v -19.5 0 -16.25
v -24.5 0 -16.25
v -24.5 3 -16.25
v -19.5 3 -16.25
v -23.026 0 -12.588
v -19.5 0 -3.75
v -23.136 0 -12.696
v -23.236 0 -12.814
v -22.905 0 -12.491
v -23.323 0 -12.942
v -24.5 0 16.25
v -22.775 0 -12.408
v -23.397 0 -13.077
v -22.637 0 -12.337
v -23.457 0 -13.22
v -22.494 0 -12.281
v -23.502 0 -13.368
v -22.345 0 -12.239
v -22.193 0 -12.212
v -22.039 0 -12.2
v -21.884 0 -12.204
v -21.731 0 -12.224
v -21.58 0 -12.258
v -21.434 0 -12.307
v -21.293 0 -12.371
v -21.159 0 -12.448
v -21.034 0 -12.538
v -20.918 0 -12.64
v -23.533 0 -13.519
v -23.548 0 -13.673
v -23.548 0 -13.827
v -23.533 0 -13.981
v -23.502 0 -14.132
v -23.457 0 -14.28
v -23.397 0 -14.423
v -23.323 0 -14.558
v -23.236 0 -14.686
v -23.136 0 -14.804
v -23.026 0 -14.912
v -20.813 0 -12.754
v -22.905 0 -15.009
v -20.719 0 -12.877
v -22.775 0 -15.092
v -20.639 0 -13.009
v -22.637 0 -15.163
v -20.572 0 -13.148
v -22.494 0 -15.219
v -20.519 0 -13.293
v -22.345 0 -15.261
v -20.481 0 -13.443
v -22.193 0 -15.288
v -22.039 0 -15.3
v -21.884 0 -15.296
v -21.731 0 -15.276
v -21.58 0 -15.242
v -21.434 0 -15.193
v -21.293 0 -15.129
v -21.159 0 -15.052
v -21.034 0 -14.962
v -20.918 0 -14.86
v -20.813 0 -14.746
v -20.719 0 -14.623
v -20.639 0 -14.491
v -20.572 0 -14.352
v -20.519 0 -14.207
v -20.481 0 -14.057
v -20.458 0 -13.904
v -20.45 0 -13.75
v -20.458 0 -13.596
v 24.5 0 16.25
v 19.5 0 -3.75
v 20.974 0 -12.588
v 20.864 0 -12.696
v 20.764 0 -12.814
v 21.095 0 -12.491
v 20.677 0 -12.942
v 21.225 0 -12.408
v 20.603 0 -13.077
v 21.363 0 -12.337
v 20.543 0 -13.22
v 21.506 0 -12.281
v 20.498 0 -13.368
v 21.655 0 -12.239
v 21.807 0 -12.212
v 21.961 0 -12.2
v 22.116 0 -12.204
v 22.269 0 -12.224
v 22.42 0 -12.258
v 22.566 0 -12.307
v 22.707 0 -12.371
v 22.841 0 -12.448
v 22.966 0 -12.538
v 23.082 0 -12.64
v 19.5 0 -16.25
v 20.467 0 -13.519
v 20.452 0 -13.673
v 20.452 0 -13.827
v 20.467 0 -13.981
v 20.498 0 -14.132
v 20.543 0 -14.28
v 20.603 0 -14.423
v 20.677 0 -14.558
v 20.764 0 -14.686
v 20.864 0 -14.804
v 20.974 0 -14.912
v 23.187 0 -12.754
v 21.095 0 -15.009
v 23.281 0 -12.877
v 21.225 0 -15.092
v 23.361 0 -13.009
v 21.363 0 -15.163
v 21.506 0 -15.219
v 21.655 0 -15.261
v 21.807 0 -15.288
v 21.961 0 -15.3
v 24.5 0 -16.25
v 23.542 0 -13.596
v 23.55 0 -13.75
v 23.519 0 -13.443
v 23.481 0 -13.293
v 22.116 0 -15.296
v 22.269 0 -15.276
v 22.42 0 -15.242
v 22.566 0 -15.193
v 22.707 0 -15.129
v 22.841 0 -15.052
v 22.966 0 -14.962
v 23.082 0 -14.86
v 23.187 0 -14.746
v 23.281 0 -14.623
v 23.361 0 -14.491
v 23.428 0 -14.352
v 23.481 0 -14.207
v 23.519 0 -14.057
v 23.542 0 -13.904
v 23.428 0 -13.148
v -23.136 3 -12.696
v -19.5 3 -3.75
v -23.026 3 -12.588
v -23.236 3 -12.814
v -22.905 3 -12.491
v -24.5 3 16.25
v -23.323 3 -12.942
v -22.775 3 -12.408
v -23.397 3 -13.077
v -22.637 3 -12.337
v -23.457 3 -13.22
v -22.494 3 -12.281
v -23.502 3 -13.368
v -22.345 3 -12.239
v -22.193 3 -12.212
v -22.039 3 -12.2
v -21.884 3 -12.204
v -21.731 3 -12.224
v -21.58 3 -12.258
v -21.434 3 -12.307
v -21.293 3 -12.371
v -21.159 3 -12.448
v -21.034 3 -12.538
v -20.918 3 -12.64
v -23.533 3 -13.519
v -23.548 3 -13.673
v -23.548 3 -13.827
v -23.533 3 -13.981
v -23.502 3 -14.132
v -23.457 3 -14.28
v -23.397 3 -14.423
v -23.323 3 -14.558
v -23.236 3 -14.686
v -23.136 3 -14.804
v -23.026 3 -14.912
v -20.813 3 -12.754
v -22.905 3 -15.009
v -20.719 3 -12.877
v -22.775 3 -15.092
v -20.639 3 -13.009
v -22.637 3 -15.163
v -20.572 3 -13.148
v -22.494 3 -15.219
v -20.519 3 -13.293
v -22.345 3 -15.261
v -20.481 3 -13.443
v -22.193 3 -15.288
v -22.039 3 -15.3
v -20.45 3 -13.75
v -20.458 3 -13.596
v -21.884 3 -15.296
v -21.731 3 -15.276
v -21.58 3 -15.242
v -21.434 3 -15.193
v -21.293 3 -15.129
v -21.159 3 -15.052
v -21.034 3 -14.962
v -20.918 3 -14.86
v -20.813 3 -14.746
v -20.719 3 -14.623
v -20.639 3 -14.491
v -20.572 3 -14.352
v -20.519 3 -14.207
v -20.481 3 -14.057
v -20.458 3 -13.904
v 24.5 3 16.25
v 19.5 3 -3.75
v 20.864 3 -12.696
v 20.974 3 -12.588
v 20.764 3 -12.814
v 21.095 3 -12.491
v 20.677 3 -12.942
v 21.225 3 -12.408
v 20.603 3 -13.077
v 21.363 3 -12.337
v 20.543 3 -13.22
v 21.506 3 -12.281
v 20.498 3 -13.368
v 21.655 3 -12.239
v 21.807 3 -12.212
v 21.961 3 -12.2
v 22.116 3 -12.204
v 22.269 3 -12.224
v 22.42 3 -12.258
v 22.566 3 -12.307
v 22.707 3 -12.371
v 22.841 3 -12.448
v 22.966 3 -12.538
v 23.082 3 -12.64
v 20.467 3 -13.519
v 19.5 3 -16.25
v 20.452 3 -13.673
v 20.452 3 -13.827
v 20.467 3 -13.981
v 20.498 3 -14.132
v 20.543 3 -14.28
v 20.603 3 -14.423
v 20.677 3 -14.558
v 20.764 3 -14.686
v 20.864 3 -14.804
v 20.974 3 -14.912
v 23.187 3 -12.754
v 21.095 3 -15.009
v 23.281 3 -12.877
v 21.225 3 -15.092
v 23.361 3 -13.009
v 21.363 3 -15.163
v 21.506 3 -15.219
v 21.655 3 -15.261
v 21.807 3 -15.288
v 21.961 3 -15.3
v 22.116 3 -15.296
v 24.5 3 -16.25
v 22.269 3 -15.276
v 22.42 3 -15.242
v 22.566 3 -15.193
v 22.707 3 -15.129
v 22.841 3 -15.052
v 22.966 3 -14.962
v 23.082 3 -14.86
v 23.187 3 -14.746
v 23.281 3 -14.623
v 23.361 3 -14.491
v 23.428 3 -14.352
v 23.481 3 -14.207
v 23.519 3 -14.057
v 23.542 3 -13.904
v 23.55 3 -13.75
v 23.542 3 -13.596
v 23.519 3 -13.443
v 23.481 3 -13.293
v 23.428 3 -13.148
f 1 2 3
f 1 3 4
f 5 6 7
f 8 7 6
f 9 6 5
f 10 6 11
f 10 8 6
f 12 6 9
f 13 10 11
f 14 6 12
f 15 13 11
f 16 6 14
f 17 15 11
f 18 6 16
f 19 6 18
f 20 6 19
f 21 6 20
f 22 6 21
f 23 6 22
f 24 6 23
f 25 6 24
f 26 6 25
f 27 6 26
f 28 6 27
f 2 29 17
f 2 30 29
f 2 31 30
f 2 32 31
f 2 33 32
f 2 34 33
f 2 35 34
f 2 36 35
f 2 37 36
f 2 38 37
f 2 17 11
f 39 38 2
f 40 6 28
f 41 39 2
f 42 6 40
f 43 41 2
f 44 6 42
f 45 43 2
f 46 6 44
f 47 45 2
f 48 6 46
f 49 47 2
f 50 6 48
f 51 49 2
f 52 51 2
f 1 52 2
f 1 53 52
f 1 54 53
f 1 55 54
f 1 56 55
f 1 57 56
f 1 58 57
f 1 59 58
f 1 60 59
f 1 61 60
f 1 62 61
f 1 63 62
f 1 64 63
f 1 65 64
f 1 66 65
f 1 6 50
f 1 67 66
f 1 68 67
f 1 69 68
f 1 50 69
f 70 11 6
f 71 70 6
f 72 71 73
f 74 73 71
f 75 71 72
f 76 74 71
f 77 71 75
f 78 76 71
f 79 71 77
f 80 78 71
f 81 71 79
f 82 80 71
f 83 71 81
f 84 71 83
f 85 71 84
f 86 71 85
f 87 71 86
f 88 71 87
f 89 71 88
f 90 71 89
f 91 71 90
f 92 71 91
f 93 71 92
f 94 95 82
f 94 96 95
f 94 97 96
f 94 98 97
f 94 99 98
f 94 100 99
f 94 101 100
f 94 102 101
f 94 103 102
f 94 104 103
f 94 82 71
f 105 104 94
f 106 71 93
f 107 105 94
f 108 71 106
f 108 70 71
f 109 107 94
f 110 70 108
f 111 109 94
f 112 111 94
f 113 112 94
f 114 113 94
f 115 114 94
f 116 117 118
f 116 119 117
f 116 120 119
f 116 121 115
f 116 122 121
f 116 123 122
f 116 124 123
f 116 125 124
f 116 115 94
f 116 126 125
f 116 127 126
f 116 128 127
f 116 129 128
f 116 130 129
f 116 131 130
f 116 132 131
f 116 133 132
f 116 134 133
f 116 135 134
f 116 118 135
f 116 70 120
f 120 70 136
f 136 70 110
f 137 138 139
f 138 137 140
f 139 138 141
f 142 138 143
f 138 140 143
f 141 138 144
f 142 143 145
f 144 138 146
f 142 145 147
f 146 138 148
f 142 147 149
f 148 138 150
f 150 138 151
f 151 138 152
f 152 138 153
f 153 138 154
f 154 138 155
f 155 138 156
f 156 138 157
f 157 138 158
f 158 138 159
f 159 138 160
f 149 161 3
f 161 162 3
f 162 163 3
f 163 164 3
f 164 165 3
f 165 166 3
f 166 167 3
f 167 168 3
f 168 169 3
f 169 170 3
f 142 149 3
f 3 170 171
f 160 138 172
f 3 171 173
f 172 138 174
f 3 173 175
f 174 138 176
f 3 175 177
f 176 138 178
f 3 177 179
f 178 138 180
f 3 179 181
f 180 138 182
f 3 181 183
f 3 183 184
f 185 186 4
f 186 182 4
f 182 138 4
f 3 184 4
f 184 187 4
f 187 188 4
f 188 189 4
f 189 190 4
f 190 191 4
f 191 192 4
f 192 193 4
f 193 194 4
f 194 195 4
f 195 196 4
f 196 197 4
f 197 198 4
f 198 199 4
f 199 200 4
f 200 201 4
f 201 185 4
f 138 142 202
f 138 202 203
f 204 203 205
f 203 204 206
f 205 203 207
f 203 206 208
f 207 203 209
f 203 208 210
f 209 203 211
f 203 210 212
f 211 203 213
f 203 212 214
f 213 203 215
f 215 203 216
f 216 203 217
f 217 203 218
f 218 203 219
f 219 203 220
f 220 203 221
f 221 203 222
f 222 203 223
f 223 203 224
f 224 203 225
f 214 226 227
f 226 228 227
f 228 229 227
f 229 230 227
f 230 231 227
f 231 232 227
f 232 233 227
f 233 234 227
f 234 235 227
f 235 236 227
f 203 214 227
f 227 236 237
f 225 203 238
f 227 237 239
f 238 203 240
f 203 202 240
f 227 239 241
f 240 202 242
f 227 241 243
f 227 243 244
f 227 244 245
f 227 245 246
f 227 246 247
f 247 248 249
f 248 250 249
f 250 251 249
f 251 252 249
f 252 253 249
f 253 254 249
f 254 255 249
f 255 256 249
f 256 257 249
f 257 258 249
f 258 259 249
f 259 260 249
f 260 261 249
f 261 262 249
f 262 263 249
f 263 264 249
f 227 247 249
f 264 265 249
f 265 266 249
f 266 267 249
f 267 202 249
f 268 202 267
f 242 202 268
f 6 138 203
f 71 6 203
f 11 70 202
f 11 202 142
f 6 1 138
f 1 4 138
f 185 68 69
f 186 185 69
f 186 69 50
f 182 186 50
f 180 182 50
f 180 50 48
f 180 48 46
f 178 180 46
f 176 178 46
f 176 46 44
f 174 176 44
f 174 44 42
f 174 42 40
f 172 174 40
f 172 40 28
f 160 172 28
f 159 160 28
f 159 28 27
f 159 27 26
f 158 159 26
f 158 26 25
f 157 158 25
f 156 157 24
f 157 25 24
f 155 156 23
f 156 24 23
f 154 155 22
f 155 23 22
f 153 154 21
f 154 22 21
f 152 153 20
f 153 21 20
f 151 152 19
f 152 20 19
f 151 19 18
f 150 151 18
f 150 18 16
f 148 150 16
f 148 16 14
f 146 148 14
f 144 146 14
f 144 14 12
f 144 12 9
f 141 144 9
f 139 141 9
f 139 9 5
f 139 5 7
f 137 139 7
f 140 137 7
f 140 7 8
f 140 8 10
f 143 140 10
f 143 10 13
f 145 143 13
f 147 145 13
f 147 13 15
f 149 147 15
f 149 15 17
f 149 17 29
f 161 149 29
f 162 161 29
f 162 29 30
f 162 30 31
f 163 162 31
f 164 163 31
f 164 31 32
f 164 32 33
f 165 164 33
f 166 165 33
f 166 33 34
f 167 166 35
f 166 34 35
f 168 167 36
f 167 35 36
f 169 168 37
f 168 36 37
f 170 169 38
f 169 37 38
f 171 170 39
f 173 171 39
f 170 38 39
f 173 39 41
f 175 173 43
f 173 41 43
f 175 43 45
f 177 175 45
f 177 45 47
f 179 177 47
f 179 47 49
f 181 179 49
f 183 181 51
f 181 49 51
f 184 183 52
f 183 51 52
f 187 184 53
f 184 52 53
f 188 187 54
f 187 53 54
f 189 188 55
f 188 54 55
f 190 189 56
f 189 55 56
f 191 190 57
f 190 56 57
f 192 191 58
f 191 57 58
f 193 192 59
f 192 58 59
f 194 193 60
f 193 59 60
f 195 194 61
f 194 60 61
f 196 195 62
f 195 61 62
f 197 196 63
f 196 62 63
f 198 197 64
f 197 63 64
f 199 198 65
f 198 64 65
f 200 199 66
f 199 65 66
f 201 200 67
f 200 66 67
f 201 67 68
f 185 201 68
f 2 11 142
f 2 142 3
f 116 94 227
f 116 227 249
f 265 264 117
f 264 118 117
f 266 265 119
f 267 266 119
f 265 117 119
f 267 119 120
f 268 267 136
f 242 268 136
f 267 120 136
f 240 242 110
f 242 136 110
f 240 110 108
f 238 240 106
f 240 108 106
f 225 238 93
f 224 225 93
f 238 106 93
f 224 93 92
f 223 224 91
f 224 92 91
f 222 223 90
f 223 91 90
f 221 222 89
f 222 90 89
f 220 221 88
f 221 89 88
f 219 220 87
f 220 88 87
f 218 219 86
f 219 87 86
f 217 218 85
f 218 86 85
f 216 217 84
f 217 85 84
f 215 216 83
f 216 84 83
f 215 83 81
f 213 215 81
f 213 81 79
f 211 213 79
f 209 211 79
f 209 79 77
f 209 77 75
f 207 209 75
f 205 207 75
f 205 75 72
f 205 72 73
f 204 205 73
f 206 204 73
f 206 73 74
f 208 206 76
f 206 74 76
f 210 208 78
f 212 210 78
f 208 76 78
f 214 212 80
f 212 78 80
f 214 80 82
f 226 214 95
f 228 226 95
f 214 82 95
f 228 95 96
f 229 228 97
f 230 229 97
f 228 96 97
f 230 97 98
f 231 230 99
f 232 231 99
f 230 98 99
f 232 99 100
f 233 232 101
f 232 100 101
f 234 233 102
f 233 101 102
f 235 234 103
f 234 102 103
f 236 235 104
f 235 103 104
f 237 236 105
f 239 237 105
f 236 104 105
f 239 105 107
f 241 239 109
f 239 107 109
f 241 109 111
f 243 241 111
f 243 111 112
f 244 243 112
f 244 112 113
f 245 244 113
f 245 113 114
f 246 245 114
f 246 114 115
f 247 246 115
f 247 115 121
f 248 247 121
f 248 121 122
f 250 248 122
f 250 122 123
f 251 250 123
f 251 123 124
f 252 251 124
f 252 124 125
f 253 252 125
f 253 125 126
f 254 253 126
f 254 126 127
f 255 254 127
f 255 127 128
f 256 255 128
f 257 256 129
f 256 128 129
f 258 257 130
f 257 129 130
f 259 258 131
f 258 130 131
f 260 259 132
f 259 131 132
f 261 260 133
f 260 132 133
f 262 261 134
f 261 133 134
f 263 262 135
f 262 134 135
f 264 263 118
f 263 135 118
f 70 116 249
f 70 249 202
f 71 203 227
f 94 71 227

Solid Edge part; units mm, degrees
sketch "Sketch1" plane through (0, 0, 0) normal (0, -1, 0) x (1, 0, 0)
  line L0 (-24.5, -16.25) -> (24.5, -16.25)
  line L1 (24.5, -16.25) -> (24.5, 16.25)
  line L2 (24.5, 16.25) -> (-24.5, 16.25)
  line L3 (-24.5, 16.25) -> (-24.5, -16.25)
extrude "Protrusion1" add sketch "Sketch1" against normal blind 3
sketch "Sketch2" plane through (0, 0, 0) normal (0, -1, 0) x (1, 0, 0)
  line L0 (-19.5, -3.75) -> (19.5, -3.75)
  line L1 (19.5, -3.75) -> (19.5, -16.25)
  line L2 (19.5, -16.25) -> (-19.5, -16.25)
  line L3 (-19.5, -16.25) -> (-19.5, -3.75)
  dimension "D1" = 39
  dimension "D2" = 19.5
  dimension "D3" = 12.5
extrude "ExtrudedCutout_1" cut sketch "Sketch2" along normal mid plane 68.2044
sketch "Sketch3" plane through (0, 0, 0) normal (0, -1, 0) x (1, 0, 0)
  circle A0 centre (-22, -13.75) radius 1.55
  circle A1 centre (22, -13.75) radius 1.55
  dimension "D1" = 2.5
extrude "ExtrudedCutout_2" cut sketch "Sketch3" along normal mid plane 83.9594
